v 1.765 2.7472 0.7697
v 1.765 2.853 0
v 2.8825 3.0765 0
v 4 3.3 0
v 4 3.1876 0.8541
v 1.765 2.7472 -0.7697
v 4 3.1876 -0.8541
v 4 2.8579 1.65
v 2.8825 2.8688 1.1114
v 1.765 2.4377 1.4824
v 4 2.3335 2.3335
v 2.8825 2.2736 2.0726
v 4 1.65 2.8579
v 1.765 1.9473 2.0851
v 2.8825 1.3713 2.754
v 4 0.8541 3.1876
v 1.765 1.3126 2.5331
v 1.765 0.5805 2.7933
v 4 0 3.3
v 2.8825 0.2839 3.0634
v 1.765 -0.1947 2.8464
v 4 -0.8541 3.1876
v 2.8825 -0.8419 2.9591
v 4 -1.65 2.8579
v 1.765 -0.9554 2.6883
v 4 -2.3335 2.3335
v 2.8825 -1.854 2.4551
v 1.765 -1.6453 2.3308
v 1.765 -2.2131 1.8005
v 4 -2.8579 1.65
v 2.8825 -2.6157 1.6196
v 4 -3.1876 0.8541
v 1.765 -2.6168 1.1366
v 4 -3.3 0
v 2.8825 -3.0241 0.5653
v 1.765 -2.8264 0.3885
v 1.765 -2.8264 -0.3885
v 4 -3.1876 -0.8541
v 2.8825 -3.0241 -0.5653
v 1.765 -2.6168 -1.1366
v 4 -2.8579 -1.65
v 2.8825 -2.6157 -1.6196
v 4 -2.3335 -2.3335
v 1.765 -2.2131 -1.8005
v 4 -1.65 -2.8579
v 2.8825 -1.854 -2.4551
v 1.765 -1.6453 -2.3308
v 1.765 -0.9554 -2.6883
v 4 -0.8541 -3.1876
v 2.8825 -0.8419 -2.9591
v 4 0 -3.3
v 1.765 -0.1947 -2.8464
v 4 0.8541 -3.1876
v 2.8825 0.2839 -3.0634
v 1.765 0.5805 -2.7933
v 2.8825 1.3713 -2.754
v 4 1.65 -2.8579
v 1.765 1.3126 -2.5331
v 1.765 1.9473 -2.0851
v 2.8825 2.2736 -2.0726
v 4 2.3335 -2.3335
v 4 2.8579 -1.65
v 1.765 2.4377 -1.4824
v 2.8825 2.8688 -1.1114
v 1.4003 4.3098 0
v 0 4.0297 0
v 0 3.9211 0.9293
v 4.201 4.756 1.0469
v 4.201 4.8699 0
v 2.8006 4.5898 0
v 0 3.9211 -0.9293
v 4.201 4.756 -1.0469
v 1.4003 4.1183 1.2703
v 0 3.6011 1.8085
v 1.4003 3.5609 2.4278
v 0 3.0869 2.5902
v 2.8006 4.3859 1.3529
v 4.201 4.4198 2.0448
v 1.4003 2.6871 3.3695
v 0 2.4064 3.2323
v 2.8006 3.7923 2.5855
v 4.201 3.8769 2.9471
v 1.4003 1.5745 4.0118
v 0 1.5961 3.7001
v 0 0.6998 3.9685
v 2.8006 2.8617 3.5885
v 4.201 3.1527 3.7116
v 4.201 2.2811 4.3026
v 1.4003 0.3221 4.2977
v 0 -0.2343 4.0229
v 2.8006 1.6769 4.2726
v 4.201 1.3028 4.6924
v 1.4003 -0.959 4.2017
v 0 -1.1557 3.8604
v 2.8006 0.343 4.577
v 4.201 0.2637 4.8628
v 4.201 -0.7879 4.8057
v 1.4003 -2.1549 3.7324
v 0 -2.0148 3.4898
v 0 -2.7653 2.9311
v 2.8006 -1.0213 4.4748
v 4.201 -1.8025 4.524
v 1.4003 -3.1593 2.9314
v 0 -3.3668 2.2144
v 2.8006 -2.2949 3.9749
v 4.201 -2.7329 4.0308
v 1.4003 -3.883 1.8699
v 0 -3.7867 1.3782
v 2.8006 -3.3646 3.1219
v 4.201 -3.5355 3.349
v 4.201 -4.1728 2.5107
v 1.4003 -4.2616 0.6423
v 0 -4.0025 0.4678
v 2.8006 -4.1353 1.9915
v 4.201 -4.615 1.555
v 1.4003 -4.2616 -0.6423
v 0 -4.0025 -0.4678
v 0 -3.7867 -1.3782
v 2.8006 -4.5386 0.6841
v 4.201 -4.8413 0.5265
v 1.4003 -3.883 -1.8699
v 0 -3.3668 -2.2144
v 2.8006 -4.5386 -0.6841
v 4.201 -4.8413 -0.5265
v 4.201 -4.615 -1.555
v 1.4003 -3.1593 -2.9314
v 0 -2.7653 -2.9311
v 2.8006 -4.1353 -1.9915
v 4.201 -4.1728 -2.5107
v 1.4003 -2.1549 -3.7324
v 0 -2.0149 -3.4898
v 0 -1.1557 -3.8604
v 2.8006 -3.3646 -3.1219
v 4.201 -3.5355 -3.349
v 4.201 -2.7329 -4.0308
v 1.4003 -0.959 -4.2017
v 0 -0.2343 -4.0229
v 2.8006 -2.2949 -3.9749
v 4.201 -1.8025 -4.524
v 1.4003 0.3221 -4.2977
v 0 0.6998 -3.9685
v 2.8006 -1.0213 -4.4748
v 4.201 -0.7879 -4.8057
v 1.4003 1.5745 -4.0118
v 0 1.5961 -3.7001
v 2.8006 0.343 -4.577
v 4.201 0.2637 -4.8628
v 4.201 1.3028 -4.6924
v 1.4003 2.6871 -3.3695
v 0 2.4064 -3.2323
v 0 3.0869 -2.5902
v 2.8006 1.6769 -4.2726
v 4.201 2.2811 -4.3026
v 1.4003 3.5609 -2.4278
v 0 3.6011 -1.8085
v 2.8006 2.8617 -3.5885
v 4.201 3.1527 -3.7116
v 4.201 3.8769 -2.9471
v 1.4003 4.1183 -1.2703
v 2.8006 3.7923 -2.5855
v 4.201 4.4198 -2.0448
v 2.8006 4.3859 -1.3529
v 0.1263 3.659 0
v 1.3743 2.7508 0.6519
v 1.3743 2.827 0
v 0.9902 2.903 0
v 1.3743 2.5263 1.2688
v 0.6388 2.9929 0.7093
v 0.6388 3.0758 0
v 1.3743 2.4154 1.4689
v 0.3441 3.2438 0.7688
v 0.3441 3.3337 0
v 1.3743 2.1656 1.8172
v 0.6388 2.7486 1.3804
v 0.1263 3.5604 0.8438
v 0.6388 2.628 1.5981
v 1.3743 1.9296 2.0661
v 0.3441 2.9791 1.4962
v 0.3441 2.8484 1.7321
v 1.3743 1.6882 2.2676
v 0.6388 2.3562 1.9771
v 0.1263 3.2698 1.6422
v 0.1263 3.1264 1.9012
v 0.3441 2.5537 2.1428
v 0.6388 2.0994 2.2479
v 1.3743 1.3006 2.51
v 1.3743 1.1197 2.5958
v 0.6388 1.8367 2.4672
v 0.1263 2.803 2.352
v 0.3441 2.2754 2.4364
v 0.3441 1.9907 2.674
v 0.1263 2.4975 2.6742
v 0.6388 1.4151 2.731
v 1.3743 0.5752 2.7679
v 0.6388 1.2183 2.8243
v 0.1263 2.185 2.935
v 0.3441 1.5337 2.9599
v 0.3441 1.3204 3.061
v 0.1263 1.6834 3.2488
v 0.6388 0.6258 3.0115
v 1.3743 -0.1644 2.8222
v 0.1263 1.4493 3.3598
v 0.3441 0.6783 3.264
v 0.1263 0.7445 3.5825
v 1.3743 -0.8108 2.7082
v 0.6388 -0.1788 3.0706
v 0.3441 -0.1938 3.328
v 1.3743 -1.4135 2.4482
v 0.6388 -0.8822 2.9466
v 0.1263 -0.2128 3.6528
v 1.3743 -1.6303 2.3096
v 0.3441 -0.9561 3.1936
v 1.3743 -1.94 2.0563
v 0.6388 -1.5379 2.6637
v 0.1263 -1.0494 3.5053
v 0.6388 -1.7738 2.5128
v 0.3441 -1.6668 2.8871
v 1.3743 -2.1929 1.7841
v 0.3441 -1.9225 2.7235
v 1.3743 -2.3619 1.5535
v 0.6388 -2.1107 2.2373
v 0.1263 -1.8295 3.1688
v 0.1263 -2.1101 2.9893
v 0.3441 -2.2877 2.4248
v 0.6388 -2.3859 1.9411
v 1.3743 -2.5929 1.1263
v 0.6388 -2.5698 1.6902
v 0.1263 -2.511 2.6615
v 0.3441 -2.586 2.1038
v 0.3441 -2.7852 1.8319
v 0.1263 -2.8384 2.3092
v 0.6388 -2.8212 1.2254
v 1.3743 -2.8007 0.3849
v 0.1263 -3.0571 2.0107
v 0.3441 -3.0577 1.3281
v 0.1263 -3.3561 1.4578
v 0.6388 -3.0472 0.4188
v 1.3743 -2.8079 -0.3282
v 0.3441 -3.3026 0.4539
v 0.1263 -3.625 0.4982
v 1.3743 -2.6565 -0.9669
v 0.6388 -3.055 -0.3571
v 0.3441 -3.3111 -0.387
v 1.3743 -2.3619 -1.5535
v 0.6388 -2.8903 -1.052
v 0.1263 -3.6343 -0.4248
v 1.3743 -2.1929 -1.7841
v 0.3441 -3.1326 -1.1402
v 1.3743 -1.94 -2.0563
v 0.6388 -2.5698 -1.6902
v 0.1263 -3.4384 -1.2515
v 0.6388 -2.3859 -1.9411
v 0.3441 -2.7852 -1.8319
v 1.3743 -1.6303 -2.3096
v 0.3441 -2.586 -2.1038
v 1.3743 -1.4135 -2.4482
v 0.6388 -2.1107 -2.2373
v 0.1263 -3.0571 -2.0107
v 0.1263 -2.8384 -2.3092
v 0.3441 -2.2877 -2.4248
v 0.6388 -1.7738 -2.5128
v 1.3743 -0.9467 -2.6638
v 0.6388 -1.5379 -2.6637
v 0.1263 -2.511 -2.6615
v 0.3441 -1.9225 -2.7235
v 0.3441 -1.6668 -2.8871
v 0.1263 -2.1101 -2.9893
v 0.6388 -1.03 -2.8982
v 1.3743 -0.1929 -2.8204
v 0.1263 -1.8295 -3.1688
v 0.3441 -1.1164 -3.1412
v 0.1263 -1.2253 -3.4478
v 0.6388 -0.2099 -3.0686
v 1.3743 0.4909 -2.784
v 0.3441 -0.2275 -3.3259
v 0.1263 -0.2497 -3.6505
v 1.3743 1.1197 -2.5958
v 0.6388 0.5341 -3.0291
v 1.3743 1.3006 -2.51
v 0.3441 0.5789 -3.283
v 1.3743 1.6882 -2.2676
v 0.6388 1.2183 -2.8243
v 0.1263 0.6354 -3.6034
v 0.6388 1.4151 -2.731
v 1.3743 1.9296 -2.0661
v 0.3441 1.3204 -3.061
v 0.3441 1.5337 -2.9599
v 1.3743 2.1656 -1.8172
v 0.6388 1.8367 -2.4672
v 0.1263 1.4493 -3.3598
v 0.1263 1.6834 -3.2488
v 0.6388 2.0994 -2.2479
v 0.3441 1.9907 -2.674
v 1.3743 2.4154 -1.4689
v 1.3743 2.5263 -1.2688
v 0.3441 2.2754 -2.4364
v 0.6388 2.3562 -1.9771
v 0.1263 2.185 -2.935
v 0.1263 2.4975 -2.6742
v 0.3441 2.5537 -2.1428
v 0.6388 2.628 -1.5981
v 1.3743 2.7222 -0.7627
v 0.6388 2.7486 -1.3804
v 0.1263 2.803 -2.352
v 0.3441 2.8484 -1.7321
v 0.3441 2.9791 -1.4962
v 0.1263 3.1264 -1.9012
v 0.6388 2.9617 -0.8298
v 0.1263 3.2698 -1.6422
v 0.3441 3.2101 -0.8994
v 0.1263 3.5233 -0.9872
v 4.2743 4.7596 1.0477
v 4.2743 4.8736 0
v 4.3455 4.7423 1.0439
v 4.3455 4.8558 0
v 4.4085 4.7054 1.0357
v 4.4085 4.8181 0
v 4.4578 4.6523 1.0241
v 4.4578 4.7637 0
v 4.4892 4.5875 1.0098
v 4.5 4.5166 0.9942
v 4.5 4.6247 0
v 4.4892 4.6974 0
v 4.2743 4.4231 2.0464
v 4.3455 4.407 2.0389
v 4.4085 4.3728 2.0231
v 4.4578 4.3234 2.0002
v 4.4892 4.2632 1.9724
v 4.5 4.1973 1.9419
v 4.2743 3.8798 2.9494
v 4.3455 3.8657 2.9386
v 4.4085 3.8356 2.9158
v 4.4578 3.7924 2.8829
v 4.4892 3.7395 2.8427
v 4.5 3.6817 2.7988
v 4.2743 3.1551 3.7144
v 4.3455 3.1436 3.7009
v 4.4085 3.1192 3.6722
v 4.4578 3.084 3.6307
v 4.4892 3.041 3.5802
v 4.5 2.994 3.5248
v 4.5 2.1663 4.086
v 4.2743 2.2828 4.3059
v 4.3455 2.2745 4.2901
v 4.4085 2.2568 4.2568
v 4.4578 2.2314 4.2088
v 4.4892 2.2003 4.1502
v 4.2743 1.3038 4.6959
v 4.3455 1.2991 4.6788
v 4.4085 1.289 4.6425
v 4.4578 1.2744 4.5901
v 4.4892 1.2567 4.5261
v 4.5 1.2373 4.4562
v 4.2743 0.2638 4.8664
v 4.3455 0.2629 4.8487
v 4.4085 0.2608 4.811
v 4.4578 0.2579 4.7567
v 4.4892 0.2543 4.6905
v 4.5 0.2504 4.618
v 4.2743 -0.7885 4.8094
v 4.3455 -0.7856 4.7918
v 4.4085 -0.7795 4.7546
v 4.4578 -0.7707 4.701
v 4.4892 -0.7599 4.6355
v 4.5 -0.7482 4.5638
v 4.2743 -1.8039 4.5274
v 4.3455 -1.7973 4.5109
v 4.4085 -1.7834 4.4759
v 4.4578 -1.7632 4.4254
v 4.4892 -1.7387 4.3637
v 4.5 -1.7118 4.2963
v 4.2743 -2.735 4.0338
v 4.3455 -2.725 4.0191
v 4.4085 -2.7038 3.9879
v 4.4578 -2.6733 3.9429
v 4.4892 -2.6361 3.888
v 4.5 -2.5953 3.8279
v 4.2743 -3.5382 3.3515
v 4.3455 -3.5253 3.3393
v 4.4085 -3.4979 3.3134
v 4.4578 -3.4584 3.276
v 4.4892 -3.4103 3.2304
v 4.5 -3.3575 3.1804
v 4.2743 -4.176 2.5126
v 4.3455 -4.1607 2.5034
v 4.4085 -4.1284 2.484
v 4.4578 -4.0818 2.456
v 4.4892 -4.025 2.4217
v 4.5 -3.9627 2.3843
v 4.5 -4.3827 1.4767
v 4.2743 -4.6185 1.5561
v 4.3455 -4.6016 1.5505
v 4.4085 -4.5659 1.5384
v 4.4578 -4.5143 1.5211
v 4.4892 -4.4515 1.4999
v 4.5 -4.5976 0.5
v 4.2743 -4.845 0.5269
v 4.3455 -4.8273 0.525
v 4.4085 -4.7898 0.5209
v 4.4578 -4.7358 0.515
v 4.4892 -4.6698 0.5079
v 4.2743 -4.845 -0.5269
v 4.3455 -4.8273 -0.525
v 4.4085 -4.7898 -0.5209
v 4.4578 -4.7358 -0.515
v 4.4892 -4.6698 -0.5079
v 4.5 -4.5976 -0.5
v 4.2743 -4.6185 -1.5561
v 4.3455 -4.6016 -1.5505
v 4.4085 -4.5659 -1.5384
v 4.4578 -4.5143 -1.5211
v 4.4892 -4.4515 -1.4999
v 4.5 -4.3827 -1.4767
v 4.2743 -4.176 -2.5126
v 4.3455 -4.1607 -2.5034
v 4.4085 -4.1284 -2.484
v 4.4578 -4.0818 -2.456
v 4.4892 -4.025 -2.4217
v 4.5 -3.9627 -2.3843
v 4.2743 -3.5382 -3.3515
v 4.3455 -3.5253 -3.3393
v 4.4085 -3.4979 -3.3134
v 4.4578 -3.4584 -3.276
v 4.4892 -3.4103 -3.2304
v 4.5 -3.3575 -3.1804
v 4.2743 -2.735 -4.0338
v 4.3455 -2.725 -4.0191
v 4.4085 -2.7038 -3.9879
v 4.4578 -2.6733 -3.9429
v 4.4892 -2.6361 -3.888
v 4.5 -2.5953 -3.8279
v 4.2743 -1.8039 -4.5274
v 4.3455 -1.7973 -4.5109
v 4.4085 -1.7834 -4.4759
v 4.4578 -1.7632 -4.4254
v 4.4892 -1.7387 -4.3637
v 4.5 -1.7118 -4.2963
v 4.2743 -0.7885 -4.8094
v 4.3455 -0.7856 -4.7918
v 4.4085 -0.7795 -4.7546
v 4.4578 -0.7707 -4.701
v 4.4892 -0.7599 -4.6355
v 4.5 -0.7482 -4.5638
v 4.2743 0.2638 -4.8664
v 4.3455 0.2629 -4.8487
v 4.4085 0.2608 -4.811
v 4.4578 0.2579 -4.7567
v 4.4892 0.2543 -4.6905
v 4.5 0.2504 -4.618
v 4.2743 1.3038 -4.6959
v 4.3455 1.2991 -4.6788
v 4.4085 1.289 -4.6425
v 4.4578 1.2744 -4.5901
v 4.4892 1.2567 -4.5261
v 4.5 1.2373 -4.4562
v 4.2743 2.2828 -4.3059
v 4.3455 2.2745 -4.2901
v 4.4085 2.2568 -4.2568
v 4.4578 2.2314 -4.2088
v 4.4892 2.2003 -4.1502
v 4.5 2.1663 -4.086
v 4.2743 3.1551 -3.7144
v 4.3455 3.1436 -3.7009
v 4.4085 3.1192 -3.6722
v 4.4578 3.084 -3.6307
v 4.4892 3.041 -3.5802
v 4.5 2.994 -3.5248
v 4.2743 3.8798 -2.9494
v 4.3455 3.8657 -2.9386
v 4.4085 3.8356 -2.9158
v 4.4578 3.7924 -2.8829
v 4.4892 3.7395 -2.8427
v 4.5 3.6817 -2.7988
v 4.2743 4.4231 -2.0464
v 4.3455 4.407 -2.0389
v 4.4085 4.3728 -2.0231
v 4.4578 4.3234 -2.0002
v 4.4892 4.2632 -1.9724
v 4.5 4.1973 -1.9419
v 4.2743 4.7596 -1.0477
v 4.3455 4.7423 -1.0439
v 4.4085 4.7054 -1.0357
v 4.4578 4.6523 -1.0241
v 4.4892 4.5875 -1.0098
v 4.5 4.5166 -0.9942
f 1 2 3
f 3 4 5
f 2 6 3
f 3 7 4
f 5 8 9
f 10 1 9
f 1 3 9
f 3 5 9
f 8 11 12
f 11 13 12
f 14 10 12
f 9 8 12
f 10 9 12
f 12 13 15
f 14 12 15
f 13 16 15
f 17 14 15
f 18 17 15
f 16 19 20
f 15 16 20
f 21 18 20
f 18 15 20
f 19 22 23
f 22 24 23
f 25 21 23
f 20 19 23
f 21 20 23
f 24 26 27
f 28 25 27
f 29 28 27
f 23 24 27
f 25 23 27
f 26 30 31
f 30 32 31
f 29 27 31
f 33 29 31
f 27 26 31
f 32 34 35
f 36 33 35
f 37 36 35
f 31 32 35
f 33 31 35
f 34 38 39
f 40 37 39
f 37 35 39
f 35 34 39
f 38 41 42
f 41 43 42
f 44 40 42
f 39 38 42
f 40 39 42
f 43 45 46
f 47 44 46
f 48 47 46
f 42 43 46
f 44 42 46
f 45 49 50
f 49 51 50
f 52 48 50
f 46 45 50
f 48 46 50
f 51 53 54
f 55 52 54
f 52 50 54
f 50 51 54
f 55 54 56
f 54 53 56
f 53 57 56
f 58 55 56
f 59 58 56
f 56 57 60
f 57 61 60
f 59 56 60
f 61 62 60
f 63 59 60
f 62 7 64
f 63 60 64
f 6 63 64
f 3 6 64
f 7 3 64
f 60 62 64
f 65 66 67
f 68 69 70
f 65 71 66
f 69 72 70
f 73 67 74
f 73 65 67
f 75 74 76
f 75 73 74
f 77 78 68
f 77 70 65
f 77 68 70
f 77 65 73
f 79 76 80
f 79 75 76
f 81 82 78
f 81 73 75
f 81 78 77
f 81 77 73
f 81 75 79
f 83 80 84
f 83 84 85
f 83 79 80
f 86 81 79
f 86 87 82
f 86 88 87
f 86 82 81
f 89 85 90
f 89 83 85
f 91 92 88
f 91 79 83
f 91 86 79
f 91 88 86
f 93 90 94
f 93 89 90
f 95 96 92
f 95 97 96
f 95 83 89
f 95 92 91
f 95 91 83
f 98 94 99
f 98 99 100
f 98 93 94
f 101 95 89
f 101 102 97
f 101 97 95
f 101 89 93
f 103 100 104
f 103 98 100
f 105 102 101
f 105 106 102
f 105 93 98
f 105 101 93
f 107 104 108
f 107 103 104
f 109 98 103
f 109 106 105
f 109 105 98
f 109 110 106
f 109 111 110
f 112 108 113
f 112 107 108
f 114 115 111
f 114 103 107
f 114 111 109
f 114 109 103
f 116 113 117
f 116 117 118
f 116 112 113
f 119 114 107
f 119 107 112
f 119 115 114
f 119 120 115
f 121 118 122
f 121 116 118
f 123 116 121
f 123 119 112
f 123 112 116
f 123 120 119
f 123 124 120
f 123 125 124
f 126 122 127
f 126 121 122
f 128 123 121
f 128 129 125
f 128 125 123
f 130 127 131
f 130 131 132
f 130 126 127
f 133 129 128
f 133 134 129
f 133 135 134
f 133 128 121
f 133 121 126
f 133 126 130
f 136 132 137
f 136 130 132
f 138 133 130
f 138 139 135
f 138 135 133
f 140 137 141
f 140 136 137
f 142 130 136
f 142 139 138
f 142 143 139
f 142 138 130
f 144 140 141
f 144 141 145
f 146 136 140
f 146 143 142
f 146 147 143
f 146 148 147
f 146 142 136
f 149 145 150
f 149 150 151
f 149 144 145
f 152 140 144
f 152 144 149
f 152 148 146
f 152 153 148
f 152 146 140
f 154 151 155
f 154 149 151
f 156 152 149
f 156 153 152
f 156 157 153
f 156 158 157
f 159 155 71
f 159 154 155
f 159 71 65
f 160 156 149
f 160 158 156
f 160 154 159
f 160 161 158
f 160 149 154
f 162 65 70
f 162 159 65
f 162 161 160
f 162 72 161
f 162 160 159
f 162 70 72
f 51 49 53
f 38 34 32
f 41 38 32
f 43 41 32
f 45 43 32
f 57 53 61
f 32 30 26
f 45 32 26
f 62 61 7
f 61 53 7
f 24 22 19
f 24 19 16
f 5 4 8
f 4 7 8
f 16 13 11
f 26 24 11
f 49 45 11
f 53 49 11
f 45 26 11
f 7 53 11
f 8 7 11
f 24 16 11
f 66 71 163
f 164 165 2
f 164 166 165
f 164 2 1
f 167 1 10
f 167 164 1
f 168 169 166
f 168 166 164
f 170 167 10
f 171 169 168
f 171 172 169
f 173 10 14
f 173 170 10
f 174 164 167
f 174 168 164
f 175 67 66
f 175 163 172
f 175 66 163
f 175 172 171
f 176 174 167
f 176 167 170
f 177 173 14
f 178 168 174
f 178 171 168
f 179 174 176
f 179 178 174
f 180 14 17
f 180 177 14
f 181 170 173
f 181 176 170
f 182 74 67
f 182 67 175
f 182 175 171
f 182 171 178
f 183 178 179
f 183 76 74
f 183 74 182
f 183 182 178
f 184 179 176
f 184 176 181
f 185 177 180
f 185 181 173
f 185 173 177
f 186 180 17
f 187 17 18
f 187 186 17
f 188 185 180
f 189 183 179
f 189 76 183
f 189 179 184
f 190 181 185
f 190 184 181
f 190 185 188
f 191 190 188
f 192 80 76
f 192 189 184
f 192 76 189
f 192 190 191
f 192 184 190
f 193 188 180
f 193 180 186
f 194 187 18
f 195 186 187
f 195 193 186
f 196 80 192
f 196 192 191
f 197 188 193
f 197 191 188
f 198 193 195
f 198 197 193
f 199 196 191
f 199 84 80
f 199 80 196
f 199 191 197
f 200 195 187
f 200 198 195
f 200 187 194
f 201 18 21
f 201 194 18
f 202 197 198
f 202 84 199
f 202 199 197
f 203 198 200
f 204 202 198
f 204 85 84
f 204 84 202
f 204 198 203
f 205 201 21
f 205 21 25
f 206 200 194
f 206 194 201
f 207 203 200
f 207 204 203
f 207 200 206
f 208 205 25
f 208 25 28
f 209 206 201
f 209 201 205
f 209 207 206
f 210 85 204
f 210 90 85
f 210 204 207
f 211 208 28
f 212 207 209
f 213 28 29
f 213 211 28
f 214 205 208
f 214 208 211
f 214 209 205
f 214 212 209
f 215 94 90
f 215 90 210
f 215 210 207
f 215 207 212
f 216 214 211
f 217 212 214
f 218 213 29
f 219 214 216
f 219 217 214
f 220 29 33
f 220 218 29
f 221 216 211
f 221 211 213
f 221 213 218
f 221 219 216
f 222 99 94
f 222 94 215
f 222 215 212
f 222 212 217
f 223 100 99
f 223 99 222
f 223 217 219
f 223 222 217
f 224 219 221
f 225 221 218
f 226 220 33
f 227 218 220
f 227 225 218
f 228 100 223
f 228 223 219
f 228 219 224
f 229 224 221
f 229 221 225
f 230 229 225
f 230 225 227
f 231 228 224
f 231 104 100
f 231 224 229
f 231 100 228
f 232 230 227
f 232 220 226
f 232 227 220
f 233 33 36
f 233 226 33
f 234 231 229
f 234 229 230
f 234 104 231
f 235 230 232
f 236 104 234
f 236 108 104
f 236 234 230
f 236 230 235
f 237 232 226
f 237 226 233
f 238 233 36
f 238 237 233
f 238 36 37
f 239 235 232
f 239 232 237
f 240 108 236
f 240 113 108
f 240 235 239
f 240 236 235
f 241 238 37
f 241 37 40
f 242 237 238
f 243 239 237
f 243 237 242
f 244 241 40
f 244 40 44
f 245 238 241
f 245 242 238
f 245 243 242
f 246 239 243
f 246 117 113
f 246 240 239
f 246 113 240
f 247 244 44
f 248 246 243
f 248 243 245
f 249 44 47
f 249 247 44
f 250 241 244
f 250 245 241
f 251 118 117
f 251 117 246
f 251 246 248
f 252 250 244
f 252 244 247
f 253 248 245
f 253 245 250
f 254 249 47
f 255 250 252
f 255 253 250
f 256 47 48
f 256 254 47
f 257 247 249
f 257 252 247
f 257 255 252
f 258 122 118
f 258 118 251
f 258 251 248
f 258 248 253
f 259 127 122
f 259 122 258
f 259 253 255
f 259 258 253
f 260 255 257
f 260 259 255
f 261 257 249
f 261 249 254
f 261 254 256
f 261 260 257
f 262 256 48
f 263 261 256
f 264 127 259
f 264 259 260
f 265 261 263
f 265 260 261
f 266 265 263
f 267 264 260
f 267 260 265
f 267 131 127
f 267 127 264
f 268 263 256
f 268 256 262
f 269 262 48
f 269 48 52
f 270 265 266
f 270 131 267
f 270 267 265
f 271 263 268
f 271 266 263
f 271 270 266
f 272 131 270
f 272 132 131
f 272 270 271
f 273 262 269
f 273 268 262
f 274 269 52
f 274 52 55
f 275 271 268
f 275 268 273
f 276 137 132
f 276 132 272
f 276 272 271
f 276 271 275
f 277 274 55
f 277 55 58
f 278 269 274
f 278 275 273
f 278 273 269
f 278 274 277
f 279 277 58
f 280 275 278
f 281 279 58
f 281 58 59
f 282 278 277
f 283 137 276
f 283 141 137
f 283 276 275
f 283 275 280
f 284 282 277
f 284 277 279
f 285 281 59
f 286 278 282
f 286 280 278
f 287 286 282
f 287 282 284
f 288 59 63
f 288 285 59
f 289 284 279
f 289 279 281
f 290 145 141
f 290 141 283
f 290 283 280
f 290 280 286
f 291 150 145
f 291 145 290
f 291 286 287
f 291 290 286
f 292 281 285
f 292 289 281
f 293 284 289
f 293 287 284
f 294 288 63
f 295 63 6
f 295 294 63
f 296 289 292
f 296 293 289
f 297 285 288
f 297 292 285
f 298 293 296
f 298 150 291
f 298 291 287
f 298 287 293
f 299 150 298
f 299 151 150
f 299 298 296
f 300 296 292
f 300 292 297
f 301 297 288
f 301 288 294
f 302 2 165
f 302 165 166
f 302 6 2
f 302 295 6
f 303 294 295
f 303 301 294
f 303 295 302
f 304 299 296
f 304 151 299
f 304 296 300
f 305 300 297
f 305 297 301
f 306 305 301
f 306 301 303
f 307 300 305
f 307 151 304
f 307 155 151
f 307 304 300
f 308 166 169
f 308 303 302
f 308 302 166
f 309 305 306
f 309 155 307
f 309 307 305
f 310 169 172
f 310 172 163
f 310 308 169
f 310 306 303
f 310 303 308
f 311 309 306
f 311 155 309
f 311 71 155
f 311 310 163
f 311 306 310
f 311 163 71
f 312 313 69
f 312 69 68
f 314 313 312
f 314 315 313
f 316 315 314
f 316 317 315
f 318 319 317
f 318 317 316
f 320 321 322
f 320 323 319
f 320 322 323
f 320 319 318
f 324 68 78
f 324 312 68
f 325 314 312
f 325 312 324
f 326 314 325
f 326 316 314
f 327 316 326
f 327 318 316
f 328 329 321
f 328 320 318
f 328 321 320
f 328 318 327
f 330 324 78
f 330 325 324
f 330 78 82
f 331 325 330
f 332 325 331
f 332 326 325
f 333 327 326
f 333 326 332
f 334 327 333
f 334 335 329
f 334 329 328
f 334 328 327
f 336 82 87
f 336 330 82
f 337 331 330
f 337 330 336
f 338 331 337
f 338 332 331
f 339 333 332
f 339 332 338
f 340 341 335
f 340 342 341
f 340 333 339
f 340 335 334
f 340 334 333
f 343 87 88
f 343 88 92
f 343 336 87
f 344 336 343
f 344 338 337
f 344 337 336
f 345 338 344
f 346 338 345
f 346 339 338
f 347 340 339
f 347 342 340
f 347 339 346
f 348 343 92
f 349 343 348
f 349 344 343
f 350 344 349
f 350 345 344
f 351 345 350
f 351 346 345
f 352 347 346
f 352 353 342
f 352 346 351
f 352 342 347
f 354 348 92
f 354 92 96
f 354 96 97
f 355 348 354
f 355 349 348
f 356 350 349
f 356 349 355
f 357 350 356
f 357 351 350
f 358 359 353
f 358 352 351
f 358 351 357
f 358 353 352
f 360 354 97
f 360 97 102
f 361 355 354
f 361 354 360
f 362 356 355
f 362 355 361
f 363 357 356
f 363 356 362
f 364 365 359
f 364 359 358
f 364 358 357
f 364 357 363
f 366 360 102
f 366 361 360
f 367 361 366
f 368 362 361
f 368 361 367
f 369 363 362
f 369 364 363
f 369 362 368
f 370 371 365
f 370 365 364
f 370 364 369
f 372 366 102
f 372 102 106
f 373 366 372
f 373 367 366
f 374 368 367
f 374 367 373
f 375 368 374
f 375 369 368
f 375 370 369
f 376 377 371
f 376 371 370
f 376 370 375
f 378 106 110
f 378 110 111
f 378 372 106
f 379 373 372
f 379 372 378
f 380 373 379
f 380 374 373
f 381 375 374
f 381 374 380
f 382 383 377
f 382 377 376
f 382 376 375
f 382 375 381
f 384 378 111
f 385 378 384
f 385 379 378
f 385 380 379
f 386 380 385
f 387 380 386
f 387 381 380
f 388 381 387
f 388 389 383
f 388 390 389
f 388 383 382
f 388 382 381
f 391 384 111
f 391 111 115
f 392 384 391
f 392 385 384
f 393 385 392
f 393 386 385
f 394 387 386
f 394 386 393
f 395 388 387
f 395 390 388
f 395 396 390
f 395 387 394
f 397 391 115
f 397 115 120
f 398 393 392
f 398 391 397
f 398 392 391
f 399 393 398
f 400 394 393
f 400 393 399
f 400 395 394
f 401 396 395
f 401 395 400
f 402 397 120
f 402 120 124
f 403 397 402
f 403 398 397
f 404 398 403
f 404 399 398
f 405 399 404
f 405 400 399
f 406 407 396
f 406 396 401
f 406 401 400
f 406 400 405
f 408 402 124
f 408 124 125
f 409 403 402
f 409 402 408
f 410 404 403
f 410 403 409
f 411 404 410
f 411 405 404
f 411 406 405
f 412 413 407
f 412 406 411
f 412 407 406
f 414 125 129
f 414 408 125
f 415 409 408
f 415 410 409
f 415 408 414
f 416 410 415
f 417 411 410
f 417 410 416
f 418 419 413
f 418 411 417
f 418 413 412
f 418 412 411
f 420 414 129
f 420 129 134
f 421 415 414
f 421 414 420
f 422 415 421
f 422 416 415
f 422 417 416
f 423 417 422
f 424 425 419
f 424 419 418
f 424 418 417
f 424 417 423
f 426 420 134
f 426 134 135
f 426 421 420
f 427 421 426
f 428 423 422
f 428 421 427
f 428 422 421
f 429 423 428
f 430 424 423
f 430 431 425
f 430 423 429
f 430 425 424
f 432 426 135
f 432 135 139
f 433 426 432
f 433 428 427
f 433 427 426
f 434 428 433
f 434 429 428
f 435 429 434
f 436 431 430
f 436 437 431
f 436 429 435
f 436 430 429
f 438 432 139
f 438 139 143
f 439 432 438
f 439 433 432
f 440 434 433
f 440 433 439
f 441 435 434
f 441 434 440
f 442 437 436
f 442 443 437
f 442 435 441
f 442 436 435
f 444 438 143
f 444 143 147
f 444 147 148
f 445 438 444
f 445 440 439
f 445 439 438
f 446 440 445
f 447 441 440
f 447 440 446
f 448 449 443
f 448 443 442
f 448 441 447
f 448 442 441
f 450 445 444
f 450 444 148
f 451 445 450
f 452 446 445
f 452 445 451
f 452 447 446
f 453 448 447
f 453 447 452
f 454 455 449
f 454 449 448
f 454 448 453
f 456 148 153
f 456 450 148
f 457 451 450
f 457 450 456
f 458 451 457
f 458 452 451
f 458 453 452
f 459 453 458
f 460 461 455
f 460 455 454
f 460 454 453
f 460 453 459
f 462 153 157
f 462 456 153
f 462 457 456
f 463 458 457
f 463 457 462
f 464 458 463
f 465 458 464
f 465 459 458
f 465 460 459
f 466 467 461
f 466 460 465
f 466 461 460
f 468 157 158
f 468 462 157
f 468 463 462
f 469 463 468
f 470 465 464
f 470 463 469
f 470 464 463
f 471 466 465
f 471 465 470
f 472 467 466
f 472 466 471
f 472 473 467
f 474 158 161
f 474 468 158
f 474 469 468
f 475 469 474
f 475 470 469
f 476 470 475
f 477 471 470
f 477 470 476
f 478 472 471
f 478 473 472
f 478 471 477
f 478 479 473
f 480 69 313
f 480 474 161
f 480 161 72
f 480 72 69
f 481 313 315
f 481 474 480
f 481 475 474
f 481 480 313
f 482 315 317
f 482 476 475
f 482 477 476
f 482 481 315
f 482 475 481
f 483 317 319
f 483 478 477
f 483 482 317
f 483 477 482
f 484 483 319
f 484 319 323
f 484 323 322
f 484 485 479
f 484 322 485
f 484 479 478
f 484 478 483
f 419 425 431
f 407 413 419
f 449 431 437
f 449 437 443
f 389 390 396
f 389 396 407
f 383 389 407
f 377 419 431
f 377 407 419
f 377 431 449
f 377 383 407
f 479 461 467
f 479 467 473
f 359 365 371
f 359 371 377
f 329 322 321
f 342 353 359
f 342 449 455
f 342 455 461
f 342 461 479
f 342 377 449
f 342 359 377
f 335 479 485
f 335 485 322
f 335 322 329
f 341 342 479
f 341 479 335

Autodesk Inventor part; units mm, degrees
sketch "Skizze1" plane through (0, 0, 0) normal (0, 0, 1) x (1, 0, 0)
  line L0 (4, 3.3) -> (0, 2.5)
  line L1 (4.5, 4.9297) -> (0, 4.0297)
  line L2 (0, 2.5) -> (0, 4.0297)
  line L3 (4.5, 4.9297) -> (4.5, 3.4)
  line L4 (-0.9, 0) -> (5.4, 0) projected
  line L5 (4.5, 3.4) -> (4.5, 0)
  line L6 (4, 3.3) -> (4, 0)
  line L7 (4, 0) -> (4.5, 0)
  point P0 (0, 0)
  dimension "d53" = 2.5
  dimension "d55" = 1.5
  dimension "d61" = 4.5
  dimension "d62" = 0.5
revolve "Umdrehung1" add sketch "Skizze1" angle 360 about axis through (-10, 0, 0) along (1, 0, 0)
fillet "Rundung8" radius 1.5 1 edges at (0, -2.5, 0)
fillet "Rundung9" radius 0.25 1 edges at (4.5, -4.9297, 0)
properties part number "ScheinwerferFront"
